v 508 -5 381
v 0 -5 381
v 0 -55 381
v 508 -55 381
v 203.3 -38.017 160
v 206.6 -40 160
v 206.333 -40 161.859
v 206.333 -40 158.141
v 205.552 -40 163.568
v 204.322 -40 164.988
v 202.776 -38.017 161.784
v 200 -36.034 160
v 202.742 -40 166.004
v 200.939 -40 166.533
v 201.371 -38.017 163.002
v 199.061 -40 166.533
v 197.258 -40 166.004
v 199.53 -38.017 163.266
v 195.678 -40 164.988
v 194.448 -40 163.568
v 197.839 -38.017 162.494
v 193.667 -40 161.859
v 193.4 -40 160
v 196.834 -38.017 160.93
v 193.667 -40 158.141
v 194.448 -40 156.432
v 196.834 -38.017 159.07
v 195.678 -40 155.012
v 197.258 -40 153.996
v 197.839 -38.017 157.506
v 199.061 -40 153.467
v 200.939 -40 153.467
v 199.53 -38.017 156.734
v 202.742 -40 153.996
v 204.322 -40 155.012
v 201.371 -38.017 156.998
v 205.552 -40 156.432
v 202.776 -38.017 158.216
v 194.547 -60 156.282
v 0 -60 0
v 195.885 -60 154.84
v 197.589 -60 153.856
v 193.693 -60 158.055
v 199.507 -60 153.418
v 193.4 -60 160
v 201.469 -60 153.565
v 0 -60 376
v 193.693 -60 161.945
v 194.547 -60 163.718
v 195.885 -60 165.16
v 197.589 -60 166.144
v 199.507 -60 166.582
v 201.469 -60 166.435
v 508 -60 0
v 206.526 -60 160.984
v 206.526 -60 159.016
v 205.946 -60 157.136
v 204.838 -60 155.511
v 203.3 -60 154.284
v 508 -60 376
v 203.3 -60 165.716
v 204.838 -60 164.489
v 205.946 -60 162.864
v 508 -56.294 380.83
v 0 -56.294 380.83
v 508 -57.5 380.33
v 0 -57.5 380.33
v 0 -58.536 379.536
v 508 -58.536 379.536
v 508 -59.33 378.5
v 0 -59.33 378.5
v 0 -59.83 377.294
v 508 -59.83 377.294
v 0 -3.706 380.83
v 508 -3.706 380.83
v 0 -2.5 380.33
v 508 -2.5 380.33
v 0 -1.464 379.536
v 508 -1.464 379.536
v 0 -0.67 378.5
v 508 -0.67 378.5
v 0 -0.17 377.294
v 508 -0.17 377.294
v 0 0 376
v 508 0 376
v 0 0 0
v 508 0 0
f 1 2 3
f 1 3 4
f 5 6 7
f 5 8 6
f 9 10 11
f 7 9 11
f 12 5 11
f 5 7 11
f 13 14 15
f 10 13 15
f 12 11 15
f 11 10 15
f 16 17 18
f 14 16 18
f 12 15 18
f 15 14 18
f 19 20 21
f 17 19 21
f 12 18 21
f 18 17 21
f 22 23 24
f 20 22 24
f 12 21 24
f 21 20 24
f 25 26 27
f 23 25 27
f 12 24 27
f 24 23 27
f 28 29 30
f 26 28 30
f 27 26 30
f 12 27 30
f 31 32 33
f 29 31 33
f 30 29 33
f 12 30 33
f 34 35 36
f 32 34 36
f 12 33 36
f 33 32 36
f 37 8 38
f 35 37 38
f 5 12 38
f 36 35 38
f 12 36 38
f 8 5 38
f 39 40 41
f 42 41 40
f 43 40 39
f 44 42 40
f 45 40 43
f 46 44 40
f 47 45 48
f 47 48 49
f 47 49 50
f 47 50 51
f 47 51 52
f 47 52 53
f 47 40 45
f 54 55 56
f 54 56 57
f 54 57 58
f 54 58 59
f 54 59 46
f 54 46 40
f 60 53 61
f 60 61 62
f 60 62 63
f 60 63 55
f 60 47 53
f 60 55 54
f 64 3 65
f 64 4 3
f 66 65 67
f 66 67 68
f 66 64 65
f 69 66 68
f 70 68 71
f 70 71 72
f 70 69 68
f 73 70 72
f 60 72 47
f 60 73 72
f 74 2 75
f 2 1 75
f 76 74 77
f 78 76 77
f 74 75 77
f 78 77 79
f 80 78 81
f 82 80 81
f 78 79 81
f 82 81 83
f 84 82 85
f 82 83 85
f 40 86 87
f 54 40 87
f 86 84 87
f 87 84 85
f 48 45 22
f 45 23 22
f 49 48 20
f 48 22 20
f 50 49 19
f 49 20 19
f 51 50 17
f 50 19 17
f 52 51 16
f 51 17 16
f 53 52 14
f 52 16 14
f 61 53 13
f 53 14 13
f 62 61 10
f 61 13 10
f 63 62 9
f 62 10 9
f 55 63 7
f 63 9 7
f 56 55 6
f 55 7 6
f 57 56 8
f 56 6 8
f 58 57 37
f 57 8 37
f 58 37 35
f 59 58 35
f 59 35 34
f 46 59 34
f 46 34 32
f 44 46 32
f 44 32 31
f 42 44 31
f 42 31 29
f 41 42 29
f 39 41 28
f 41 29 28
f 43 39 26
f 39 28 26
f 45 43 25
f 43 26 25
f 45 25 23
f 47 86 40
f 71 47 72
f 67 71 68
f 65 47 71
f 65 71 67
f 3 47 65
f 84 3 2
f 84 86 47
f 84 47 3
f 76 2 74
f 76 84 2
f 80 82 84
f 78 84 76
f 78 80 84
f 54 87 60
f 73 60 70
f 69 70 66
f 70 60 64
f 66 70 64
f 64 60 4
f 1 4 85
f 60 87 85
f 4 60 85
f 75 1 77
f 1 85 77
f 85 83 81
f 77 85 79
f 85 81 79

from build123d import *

# Parameters (mm, degrees)
F0_W     = 508
F0_H     = 381
F1_DEPTH = 60
F3_D     = 13.2
F3_DEPTH = 20
F3_TIP   = 3.9656800856
F4_R     = 5


with BuildPart() as f1:
    # F0 (on Front) → F1 (new body)
    with BuildSketch(Plane.XZ):
        with Locations((254, 190.5)):
            Rectangle(F0_W, F0_H)
    extrude(amount=F1_DEPTH)

    # F3
    with Locations(Plane.XZ.offset(60)):
        with Locations((200, 160)):
            Hole(F3_D / 2, depth=F3_DEPTH)
            with Locations((0, 0, -(F3_DEPTH + F3_TIP / 2))):  # 118° drill point
                Cone(0, F3_D / 2, F3_TIP, mode=Mode.SUBTRACT)

    # F4
    f4_edges = [f1.edges().sort_by_distance(p)[0] for p in [
        (254, -60, 381),
        (254, 0, 381),
    ]]
    fillet(f4_edges, radius=F4_R)


solid = f1.part
